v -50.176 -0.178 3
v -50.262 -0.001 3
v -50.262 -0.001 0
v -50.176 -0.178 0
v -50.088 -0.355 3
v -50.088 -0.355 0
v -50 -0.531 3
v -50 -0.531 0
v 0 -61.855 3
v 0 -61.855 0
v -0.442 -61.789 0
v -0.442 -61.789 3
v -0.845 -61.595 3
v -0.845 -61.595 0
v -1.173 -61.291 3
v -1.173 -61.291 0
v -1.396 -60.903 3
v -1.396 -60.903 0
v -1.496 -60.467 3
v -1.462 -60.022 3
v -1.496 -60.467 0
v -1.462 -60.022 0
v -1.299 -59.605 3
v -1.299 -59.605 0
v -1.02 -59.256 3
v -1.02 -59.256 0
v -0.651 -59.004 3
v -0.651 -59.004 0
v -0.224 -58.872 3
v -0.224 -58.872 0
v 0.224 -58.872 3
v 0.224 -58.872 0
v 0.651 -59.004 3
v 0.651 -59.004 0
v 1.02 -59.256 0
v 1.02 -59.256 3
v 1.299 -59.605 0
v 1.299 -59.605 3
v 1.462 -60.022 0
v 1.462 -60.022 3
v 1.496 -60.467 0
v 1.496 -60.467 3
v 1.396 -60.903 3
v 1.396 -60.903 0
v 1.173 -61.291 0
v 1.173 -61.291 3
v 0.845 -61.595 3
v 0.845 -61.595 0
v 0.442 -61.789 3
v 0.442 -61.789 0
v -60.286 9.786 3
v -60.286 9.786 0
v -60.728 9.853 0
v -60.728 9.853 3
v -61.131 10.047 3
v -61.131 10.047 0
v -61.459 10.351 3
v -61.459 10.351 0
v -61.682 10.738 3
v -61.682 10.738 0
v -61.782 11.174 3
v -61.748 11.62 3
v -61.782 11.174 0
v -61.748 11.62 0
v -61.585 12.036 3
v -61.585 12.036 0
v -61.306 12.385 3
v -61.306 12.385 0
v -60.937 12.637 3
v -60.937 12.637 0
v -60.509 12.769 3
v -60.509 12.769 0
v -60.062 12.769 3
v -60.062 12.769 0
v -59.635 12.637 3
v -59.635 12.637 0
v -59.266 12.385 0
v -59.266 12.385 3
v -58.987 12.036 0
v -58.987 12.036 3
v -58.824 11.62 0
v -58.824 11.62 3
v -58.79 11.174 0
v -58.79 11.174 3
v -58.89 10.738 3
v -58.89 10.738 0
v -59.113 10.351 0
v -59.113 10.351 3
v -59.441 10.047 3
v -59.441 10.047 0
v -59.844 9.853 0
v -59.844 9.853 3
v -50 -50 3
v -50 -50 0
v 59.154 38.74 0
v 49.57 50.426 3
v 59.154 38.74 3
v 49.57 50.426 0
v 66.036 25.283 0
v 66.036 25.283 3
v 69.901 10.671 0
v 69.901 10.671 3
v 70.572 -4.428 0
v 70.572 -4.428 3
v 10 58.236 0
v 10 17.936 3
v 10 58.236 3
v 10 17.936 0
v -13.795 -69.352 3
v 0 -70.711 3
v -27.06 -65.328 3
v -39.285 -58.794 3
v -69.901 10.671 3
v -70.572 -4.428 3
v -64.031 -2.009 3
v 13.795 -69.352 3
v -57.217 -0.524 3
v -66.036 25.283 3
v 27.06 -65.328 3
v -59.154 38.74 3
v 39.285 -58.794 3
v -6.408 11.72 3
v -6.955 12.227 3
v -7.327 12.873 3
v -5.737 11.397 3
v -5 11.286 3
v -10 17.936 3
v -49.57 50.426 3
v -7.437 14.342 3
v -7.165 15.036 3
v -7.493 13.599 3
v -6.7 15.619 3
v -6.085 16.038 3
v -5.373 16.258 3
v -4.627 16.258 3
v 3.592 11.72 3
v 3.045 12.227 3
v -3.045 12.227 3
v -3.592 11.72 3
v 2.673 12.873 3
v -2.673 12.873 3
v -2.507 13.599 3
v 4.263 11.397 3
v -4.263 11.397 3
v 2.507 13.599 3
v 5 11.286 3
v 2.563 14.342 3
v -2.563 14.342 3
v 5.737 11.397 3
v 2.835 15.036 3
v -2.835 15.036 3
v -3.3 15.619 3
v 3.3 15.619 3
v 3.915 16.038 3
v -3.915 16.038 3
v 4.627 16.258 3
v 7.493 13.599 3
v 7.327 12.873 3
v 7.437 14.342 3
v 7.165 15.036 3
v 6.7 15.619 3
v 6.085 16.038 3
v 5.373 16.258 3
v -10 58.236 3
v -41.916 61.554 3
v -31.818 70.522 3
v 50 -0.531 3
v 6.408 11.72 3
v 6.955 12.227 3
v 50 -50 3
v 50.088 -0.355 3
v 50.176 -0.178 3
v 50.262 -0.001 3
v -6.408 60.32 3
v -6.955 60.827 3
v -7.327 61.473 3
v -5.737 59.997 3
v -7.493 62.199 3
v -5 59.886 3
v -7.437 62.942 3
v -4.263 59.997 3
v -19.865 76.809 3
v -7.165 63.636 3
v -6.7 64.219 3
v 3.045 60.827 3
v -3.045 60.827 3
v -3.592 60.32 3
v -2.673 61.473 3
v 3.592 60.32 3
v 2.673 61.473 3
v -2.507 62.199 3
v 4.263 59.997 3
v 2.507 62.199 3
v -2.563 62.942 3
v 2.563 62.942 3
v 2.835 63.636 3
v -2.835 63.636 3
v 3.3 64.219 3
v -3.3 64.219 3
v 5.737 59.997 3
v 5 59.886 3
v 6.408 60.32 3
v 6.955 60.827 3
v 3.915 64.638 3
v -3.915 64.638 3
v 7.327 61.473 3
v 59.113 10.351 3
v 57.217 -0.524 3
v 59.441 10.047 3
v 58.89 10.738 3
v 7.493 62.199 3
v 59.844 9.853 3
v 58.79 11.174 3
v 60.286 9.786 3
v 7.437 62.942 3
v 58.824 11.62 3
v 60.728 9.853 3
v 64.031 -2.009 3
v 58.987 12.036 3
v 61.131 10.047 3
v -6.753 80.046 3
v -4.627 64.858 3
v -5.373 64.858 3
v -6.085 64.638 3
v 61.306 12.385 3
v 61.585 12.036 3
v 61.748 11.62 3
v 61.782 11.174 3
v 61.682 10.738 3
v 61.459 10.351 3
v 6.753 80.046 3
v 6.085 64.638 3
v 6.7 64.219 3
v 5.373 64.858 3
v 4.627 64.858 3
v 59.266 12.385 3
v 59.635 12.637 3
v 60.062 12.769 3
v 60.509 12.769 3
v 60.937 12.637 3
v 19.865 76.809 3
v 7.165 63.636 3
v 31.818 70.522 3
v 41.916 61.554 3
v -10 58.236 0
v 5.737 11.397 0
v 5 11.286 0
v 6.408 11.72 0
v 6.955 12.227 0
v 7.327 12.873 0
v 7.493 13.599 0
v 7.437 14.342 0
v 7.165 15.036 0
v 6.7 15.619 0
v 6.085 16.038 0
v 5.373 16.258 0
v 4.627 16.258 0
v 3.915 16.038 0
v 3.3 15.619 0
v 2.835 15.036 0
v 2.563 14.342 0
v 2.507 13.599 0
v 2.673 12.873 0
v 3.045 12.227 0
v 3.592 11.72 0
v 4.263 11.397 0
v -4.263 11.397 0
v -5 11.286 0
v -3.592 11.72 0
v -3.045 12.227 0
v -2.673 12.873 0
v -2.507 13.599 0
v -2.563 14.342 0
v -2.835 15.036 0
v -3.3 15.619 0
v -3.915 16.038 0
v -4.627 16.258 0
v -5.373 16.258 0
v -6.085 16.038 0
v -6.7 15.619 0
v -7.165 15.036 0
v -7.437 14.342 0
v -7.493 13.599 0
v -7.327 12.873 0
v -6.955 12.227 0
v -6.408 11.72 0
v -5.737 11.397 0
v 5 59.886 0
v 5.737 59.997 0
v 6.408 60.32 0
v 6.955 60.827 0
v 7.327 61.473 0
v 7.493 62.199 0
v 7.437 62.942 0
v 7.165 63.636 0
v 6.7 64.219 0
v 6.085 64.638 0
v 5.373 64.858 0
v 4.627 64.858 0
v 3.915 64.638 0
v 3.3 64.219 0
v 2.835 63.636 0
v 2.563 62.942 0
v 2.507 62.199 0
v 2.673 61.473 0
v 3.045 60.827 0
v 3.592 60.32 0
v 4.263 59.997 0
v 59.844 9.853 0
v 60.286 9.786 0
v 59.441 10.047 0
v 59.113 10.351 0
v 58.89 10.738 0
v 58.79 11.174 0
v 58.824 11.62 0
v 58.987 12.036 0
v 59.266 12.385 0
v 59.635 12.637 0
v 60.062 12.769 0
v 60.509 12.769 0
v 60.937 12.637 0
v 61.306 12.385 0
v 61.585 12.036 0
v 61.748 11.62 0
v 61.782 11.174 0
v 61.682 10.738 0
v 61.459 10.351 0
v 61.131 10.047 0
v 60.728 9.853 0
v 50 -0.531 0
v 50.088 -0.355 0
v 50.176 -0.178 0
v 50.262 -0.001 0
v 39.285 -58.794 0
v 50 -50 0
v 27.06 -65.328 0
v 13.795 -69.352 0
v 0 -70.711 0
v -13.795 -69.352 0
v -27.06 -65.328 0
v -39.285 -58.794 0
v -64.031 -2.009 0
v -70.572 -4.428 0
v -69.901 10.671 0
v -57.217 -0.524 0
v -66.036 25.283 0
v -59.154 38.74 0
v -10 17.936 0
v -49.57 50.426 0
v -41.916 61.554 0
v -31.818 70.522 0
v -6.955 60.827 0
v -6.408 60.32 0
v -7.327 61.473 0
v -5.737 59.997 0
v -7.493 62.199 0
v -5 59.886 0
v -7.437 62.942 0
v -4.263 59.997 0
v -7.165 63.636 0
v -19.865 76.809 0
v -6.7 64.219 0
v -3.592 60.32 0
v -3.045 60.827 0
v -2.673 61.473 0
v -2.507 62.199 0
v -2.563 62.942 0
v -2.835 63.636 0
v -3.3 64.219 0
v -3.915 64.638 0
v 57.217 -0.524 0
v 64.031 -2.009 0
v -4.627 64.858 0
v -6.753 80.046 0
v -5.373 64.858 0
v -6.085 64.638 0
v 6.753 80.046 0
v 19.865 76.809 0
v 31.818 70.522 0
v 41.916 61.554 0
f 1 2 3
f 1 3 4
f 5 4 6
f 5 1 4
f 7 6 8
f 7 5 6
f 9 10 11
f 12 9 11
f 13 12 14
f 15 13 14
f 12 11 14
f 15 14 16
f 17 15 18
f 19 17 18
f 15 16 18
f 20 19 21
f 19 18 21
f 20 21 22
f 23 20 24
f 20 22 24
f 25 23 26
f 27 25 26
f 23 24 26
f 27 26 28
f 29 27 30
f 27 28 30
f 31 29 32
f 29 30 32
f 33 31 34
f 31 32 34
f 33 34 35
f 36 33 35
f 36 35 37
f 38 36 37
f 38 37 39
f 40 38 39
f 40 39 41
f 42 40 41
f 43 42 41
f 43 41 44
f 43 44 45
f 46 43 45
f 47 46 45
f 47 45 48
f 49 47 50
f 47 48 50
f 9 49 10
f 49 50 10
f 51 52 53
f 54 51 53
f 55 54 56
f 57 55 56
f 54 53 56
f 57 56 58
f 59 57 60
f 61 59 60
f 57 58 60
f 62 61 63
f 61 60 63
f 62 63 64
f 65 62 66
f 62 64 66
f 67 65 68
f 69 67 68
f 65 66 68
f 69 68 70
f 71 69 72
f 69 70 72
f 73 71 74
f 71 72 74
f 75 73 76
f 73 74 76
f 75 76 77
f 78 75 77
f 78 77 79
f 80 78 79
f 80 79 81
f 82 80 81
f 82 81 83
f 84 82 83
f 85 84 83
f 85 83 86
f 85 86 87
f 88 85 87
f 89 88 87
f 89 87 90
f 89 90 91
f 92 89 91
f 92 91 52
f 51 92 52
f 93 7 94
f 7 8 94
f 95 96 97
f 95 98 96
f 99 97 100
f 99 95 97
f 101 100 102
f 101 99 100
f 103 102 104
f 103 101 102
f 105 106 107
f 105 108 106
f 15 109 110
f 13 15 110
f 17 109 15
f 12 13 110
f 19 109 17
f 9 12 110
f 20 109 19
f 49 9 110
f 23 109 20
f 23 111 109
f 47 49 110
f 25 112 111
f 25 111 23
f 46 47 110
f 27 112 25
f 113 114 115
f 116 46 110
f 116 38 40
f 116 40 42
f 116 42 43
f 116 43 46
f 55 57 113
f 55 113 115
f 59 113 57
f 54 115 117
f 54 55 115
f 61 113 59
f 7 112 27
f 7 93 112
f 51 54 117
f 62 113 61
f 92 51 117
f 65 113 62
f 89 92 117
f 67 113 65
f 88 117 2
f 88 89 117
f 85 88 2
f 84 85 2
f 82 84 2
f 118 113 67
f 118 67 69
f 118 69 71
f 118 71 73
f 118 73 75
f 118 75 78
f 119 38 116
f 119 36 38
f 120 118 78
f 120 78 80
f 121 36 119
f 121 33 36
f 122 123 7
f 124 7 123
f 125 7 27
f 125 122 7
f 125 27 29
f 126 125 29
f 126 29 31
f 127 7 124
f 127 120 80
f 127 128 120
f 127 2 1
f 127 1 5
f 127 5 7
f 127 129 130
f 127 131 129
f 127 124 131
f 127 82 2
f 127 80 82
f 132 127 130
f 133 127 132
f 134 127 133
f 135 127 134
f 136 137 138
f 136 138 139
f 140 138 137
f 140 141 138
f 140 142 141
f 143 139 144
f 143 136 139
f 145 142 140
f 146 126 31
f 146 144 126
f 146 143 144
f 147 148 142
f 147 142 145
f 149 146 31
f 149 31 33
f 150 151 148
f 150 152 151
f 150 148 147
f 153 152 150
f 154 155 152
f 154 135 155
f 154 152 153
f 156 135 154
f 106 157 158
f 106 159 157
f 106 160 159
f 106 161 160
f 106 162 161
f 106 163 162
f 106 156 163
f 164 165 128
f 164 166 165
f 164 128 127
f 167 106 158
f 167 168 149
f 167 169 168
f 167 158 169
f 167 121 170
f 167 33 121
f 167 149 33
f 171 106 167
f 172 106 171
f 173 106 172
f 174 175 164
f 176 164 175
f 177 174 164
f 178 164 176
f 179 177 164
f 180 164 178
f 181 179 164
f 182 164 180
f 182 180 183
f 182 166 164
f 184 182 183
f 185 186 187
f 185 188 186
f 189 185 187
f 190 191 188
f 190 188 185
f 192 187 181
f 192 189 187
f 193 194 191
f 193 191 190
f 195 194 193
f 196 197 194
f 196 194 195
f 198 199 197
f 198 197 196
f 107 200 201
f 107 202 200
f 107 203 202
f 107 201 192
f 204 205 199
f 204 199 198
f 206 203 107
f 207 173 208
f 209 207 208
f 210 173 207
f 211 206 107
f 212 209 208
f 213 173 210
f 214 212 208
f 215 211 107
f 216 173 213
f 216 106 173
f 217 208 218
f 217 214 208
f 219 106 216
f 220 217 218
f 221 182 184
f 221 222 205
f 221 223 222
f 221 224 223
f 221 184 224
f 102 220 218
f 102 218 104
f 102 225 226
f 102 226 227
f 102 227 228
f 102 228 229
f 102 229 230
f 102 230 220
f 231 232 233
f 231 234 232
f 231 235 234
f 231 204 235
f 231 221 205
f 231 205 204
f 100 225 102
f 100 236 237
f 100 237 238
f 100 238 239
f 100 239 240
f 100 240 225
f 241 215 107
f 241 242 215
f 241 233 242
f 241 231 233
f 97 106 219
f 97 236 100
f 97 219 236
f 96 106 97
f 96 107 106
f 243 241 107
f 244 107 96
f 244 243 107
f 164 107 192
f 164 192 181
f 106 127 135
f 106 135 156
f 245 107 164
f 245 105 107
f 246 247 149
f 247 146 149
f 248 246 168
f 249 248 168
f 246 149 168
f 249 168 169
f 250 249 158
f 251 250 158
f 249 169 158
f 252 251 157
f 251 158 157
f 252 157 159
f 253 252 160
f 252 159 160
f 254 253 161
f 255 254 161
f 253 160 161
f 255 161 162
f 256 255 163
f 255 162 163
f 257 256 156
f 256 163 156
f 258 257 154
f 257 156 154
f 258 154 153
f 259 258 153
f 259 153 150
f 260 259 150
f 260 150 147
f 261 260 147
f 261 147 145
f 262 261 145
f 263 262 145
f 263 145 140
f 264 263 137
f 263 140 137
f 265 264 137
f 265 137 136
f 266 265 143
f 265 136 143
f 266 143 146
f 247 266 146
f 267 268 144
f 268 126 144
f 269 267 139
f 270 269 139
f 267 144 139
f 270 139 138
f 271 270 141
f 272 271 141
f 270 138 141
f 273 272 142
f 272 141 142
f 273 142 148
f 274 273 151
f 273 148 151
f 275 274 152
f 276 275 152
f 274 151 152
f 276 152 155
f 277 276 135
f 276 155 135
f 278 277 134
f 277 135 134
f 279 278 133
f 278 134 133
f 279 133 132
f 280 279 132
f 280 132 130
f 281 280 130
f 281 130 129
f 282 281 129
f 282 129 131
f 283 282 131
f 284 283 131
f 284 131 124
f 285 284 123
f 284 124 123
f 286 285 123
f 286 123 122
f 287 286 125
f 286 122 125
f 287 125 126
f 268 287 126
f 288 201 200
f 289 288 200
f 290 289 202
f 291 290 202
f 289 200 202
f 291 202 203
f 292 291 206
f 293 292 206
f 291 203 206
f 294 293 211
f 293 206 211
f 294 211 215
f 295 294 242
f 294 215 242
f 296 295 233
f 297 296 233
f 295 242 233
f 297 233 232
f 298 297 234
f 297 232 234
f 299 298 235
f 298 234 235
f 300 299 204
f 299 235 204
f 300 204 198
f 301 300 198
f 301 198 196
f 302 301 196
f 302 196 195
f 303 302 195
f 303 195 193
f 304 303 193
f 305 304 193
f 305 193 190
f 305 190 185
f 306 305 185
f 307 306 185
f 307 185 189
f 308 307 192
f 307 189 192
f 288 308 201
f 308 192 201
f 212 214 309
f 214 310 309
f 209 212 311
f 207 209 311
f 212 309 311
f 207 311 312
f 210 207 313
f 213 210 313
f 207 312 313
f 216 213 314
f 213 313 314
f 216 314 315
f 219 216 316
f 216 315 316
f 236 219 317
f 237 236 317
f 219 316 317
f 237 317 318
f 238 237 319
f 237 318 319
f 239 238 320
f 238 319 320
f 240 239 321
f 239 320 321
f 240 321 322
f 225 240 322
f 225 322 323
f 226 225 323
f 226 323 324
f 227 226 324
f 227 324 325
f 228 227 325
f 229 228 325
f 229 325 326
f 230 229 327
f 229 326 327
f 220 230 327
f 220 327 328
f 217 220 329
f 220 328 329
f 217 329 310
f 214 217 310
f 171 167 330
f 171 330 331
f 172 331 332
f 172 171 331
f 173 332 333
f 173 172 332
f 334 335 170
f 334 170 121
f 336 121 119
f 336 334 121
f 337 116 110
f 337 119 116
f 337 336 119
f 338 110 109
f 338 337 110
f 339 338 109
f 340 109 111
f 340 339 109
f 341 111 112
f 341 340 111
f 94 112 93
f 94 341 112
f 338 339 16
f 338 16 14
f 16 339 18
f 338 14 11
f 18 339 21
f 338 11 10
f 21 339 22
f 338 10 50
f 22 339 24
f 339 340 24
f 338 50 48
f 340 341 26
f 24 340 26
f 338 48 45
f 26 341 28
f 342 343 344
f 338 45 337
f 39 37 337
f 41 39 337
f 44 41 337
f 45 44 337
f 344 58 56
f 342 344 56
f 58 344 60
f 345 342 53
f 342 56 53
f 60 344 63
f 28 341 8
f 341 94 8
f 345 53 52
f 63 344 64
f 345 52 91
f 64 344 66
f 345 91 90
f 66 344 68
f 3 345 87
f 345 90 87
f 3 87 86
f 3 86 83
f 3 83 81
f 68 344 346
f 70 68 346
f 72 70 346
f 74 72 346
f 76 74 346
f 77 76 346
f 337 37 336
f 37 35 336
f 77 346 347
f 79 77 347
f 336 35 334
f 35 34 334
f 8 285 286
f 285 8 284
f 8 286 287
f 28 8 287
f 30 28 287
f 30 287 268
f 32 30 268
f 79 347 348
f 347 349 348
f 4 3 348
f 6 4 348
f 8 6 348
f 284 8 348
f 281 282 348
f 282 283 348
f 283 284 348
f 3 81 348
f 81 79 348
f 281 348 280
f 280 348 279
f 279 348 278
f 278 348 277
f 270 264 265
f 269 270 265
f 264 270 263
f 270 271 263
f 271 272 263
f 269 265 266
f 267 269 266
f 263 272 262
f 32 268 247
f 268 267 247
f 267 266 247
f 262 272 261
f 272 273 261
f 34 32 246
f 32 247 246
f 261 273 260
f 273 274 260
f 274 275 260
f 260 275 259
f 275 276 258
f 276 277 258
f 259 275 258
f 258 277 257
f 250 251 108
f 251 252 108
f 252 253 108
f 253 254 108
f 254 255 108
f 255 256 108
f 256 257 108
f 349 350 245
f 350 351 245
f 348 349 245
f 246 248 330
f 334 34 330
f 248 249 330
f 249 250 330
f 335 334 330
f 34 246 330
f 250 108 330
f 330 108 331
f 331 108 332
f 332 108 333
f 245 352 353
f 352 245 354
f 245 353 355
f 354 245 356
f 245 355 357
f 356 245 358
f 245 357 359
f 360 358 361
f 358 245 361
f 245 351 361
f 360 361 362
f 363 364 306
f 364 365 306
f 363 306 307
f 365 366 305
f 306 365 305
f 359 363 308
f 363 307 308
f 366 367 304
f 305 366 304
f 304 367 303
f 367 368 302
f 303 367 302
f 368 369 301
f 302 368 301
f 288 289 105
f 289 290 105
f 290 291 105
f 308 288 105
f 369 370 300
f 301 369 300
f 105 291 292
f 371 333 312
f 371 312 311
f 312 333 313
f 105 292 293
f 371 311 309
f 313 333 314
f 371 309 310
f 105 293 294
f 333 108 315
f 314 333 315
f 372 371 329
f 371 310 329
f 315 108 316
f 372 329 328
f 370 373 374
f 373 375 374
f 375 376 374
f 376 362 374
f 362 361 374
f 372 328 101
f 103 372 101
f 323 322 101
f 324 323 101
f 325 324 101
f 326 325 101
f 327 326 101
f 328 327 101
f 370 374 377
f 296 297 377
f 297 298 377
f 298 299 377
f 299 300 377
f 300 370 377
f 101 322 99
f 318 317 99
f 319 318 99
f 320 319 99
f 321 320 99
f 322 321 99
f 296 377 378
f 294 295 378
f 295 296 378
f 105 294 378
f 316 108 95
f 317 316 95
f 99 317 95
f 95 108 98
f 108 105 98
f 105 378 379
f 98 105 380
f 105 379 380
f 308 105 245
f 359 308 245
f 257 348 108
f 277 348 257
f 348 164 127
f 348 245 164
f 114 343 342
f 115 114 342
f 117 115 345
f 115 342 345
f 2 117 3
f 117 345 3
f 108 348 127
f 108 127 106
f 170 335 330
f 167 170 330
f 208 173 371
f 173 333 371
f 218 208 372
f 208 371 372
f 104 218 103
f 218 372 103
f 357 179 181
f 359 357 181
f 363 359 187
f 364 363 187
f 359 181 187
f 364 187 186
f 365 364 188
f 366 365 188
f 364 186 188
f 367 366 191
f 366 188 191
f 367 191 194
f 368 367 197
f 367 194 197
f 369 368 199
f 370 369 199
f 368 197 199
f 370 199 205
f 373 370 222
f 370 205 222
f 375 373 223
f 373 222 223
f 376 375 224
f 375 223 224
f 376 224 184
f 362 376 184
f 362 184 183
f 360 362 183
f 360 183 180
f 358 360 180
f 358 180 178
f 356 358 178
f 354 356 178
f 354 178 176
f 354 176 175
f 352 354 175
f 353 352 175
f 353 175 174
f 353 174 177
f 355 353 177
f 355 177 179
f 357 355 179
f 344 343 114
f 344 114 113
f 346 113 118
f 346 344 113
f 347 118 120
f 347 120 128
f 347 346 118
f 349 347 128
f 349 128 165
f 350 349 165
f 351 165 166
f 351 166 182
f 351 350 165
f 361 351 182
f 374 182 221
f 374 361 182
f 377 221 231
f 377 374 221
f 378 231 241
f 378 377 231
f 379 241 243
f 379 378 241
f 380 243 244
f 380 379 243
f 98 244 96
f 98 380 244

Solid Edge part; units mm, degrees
sketch "Sketch1" plane through (0, 0, 0) normal (0, 0, 1) x (1, 0, 0)
  circle A0 centre (-6.75, 75.7107) radius 1.5
  circle A1 centre (6.75, 75.7107) radius 1.5
  line L0 (-9.75, 57.4107) -> (-21.25, 57.4107)
  line L1 (-21.25, 57.4107) -> (-21.25, 35.4107)
  line L2 (-21.25, 35.4107) -> (-9.75, 35.4107)
  line L3 (-9.75, 57.4107) -> (-9.75, 35.4107)
  circle A2 centre (17.7673, 40.9107) radius 1.5
  line L4 (50, -50) -> (50, 0)
  arc A3 (50, 0) -> (70.5719, -4.4281) centre (50, -50) cw
  arc A4 (70.5719, -4.4281) -> (49.5699, 50.4264) centre (0, 0) ccw
  arc A5 (-49.5699, 50.4264) -> (49.5699, 50.4264) centre (0, 24.5274) cw
  arc A6 (-70.5719, -4.4281) -> (-49.5699, 50.4264) centre (0, 0) cw
  arc A7 (-50, 0) -> (-70.5719, -4.4281) centre (-50, -50) ccw
  line L5 (-50, 0) -> (-50, -50)
  arc A8 (-50, -50) -> (50, -50) centre (0, 0) ccw
  dimension "D1" = 22
  dimension "D2" = 11.5
  dimension "D3" = 3
  dimension "D4" = 3
  dimension "D5" = 3
extrude "Protrusion1" add sketch "Sketch1" along normal blind 3
sketch "Sketch2" plane through (0, 4.8723, 0) normal (0, 0, -1) x (0, 1, 0)
  circle A0 centre (55.2883, -15.5) radius 1
  circle A1 centre (27.7883, -15.5) radius 1
  line L0 (25.0383, -6.5) -> (58.0383, -6.5)
  line L1 (58.0383, -6.5) -> (58.0383, -24.5)
  line L2 (58.0383, -24.5) -> (25.0383, -24.5)
  line L3 (25.0383, -24.5) -> (25.0383, -6.5)
extrude "ExtrudedProtrusion_2" add sketch "Sketch2" along normal blind 5
sketch "Sketch3" plane through (-15.5, 46.4107, 0) normal (0, 0, 1) x (1, 0, 0)
  line L0 (-5.75, 11) -> (5.75, 11)
  line L1 (5.75, 11) -> (5.75, -11)
  line L2 (5.75, -11) -> (-5.75, -11)
  line L3 (-5.75, -11) -> (-5.75, 10.8886)
extrude "Cutout1" cut sketch "Sketch3" against normal blind 126.1563 material side at (-15.5, 57.3607, 0)
sketch "Sketch4" plane through (0, 4.8723, 3) normal (0, 0, 1) x (0, 1, 0)
  circle A0 centre (-65.2277, 0) radius 1.5
  circle A1 centre (6.4136, 60.2859) radius 1.5
  circle A2 centre (6.4136, -60.2859) radius 1.5
extrude "ExtrudedProtrusion_3" add sketch "Sketch4" along normal blind 3
sketch "Sketch5" plane through (0, 4.8723, 0) normal (0, 0, -1) x (0, -1, 0)
  circle A0 centre (-6.4136, 60.2859) radius 1.5
  circle A1 centre (-6.4136, -60.2859) radius 1.5
extrude "ExtrudedCutout_3" cut sketch "Sketch5" against normal blind 1394.131
sketch "Sketch6" plane through (0, 4.8723, 0) normal (0, 0, -1) x (0, -1, 0)
  circle A0 centre (65.2277, 0) radius 1.5
extrude "ExtrudedCutout_4" cut sketch "Sketch6" against normal blind 239.0862
sketch "Sketch7" plane through (0, 4.8723, 3) normal (0, 0, 1) x (0, -1, 0)
  circle A0 centre (-55.2883, -15.5) radius 1
  circle A1 centre (-27.7883, -15.5) radius 1
extrude "ExtrudedCutout_5" cut sketch "Sketch7" against normal blind 54.4855
sketch "Sketch8" plane through (0, 4.8723, 3) normal (0, 0, 1) x (0, -1, 0)
  circle A0 centre (-19.655, 0) radius 55.928
extrude "ExtrudedProtrusion_4" add sketch "Sketch8" against normal blind 3
sketch "Sketch9" plane through (-15.5, 46.4107, -5) normal (0, 0, -1) x (-1, 0, 0)
  line L0 (-9, 16.5) -> (9, 16.5)
  line L1 (9, 16.5) -> (9, -16.5)
  line L2 (9, -16.5) -> (-9, -16.5)
  line L3 (-9, -16.5) -> (-9, 16.5)
  line L4 (-5.75, 11) -> (5.75, 11)
  line L5 (5.75, 11) -> (5.75, -11)
  line L6 (5.75, -11) -> (-5.75, -11)
  line L7 (-5.75, -11) -> (-5.75, 11)
extrude "ExtrudedCutout_6" cut sketch "Sketch9" against normal blind 5
sketch "Sketch10" plane through (0, 4.8723, 3) normal (0, 0, 1) x (0, -1, 0)
  line L0 (-13.0636, -10) -> (-13.0636, 10)
  line L1 (-13.0636, 10) -> (-33.2136, 10)
  line L2 (-33.2136, 10) -> (-53.3636, 10)
  line L3 (-53.3636, 10) -> (-53.3636, -10)
  line L4 (-53.3636, -10) -> (-33.2136, -10)
  line L5 (-33.2136, -10) -> (-13.0636, -10)
  circle A0 centre (-56.6886, -5.0517) radius 2.5
  circle A1 centre (-56.6886, 5) radius 2.5
  circle A2 centre (-9.7386, -5) radius 2.5
  circle A3 centre (-9.7386, 5) radius 2.5
extrude "ExtrudedProtrusion_5" add sketch "Sketch10" against normal blind 77.7502
sketch "Sketch11" plane through (0, 38.0859, -74.7502) normal (0, 0, -1) x (-1, 0, 0)
  line L0 (-10, 20.15) -> (10, 20.15)
  line L1 (10, 20.15) -> (10, -20.15)
  line L2 (10, -20.15) -> (-10, -20.15)
  line L3 (-10, -20.15) -> (-10, 20.15)
  circle A0 centre (-5, 23.475) radius 2.5
  circle A1 centre (5.0517, 23.475) radius 2.5
  circle A2 centre (5, -23.475) radius 2.5
  circle A3 centre (-5, -23.475) radius 2.5
extrude "ExtrudedCutout_7" cut sketch "Sketch11" against normal blind 2727.0102
sketch "Sketch12" plane through (0, 4.8723, 3) normal (0, 0, 1) x (0, -1, 0)
  line L0 (-53.3636, -10) -> (-60.0136, -10)
  line L1 (-60.0136, -10) -> (-60.0136, 10)
  line L2 (-60.0136, 10) -> (-53.3636, 10)
  line L3 (-53.3636, -10) -> (-53.3636, 10)
  line L4 (-13.0636, 10) -> (-6.4136, 10)
  line L5 (-6.4136, 10) -> (-6.4136, -10)
  line L6 (-6.4136, -10) -> (-13.0636, -10)
  line L7 (-13.0636, 10) -> (-13.0636, -10)
extrude "ExtrudedProtrusion_6" add sketch "Sketch12" against normal blind 3
sketch "Sketch13" plane through (0, 4.8723, 3) normal (0, 0, 1) x (0, -1, 0)
  circle A0 centre (-57.5136, 5) radius 2.5
  circle A1 centre (-57.5136, -5) radius 2.5
  circle A2 centre (-8.9136, 5) radius 2.5
  circle A3 centre (-8.9136, -5) radius 2.5
extrude "ExtrudedCutout_8" cut sketch "Sketch13" against normal blind 3
